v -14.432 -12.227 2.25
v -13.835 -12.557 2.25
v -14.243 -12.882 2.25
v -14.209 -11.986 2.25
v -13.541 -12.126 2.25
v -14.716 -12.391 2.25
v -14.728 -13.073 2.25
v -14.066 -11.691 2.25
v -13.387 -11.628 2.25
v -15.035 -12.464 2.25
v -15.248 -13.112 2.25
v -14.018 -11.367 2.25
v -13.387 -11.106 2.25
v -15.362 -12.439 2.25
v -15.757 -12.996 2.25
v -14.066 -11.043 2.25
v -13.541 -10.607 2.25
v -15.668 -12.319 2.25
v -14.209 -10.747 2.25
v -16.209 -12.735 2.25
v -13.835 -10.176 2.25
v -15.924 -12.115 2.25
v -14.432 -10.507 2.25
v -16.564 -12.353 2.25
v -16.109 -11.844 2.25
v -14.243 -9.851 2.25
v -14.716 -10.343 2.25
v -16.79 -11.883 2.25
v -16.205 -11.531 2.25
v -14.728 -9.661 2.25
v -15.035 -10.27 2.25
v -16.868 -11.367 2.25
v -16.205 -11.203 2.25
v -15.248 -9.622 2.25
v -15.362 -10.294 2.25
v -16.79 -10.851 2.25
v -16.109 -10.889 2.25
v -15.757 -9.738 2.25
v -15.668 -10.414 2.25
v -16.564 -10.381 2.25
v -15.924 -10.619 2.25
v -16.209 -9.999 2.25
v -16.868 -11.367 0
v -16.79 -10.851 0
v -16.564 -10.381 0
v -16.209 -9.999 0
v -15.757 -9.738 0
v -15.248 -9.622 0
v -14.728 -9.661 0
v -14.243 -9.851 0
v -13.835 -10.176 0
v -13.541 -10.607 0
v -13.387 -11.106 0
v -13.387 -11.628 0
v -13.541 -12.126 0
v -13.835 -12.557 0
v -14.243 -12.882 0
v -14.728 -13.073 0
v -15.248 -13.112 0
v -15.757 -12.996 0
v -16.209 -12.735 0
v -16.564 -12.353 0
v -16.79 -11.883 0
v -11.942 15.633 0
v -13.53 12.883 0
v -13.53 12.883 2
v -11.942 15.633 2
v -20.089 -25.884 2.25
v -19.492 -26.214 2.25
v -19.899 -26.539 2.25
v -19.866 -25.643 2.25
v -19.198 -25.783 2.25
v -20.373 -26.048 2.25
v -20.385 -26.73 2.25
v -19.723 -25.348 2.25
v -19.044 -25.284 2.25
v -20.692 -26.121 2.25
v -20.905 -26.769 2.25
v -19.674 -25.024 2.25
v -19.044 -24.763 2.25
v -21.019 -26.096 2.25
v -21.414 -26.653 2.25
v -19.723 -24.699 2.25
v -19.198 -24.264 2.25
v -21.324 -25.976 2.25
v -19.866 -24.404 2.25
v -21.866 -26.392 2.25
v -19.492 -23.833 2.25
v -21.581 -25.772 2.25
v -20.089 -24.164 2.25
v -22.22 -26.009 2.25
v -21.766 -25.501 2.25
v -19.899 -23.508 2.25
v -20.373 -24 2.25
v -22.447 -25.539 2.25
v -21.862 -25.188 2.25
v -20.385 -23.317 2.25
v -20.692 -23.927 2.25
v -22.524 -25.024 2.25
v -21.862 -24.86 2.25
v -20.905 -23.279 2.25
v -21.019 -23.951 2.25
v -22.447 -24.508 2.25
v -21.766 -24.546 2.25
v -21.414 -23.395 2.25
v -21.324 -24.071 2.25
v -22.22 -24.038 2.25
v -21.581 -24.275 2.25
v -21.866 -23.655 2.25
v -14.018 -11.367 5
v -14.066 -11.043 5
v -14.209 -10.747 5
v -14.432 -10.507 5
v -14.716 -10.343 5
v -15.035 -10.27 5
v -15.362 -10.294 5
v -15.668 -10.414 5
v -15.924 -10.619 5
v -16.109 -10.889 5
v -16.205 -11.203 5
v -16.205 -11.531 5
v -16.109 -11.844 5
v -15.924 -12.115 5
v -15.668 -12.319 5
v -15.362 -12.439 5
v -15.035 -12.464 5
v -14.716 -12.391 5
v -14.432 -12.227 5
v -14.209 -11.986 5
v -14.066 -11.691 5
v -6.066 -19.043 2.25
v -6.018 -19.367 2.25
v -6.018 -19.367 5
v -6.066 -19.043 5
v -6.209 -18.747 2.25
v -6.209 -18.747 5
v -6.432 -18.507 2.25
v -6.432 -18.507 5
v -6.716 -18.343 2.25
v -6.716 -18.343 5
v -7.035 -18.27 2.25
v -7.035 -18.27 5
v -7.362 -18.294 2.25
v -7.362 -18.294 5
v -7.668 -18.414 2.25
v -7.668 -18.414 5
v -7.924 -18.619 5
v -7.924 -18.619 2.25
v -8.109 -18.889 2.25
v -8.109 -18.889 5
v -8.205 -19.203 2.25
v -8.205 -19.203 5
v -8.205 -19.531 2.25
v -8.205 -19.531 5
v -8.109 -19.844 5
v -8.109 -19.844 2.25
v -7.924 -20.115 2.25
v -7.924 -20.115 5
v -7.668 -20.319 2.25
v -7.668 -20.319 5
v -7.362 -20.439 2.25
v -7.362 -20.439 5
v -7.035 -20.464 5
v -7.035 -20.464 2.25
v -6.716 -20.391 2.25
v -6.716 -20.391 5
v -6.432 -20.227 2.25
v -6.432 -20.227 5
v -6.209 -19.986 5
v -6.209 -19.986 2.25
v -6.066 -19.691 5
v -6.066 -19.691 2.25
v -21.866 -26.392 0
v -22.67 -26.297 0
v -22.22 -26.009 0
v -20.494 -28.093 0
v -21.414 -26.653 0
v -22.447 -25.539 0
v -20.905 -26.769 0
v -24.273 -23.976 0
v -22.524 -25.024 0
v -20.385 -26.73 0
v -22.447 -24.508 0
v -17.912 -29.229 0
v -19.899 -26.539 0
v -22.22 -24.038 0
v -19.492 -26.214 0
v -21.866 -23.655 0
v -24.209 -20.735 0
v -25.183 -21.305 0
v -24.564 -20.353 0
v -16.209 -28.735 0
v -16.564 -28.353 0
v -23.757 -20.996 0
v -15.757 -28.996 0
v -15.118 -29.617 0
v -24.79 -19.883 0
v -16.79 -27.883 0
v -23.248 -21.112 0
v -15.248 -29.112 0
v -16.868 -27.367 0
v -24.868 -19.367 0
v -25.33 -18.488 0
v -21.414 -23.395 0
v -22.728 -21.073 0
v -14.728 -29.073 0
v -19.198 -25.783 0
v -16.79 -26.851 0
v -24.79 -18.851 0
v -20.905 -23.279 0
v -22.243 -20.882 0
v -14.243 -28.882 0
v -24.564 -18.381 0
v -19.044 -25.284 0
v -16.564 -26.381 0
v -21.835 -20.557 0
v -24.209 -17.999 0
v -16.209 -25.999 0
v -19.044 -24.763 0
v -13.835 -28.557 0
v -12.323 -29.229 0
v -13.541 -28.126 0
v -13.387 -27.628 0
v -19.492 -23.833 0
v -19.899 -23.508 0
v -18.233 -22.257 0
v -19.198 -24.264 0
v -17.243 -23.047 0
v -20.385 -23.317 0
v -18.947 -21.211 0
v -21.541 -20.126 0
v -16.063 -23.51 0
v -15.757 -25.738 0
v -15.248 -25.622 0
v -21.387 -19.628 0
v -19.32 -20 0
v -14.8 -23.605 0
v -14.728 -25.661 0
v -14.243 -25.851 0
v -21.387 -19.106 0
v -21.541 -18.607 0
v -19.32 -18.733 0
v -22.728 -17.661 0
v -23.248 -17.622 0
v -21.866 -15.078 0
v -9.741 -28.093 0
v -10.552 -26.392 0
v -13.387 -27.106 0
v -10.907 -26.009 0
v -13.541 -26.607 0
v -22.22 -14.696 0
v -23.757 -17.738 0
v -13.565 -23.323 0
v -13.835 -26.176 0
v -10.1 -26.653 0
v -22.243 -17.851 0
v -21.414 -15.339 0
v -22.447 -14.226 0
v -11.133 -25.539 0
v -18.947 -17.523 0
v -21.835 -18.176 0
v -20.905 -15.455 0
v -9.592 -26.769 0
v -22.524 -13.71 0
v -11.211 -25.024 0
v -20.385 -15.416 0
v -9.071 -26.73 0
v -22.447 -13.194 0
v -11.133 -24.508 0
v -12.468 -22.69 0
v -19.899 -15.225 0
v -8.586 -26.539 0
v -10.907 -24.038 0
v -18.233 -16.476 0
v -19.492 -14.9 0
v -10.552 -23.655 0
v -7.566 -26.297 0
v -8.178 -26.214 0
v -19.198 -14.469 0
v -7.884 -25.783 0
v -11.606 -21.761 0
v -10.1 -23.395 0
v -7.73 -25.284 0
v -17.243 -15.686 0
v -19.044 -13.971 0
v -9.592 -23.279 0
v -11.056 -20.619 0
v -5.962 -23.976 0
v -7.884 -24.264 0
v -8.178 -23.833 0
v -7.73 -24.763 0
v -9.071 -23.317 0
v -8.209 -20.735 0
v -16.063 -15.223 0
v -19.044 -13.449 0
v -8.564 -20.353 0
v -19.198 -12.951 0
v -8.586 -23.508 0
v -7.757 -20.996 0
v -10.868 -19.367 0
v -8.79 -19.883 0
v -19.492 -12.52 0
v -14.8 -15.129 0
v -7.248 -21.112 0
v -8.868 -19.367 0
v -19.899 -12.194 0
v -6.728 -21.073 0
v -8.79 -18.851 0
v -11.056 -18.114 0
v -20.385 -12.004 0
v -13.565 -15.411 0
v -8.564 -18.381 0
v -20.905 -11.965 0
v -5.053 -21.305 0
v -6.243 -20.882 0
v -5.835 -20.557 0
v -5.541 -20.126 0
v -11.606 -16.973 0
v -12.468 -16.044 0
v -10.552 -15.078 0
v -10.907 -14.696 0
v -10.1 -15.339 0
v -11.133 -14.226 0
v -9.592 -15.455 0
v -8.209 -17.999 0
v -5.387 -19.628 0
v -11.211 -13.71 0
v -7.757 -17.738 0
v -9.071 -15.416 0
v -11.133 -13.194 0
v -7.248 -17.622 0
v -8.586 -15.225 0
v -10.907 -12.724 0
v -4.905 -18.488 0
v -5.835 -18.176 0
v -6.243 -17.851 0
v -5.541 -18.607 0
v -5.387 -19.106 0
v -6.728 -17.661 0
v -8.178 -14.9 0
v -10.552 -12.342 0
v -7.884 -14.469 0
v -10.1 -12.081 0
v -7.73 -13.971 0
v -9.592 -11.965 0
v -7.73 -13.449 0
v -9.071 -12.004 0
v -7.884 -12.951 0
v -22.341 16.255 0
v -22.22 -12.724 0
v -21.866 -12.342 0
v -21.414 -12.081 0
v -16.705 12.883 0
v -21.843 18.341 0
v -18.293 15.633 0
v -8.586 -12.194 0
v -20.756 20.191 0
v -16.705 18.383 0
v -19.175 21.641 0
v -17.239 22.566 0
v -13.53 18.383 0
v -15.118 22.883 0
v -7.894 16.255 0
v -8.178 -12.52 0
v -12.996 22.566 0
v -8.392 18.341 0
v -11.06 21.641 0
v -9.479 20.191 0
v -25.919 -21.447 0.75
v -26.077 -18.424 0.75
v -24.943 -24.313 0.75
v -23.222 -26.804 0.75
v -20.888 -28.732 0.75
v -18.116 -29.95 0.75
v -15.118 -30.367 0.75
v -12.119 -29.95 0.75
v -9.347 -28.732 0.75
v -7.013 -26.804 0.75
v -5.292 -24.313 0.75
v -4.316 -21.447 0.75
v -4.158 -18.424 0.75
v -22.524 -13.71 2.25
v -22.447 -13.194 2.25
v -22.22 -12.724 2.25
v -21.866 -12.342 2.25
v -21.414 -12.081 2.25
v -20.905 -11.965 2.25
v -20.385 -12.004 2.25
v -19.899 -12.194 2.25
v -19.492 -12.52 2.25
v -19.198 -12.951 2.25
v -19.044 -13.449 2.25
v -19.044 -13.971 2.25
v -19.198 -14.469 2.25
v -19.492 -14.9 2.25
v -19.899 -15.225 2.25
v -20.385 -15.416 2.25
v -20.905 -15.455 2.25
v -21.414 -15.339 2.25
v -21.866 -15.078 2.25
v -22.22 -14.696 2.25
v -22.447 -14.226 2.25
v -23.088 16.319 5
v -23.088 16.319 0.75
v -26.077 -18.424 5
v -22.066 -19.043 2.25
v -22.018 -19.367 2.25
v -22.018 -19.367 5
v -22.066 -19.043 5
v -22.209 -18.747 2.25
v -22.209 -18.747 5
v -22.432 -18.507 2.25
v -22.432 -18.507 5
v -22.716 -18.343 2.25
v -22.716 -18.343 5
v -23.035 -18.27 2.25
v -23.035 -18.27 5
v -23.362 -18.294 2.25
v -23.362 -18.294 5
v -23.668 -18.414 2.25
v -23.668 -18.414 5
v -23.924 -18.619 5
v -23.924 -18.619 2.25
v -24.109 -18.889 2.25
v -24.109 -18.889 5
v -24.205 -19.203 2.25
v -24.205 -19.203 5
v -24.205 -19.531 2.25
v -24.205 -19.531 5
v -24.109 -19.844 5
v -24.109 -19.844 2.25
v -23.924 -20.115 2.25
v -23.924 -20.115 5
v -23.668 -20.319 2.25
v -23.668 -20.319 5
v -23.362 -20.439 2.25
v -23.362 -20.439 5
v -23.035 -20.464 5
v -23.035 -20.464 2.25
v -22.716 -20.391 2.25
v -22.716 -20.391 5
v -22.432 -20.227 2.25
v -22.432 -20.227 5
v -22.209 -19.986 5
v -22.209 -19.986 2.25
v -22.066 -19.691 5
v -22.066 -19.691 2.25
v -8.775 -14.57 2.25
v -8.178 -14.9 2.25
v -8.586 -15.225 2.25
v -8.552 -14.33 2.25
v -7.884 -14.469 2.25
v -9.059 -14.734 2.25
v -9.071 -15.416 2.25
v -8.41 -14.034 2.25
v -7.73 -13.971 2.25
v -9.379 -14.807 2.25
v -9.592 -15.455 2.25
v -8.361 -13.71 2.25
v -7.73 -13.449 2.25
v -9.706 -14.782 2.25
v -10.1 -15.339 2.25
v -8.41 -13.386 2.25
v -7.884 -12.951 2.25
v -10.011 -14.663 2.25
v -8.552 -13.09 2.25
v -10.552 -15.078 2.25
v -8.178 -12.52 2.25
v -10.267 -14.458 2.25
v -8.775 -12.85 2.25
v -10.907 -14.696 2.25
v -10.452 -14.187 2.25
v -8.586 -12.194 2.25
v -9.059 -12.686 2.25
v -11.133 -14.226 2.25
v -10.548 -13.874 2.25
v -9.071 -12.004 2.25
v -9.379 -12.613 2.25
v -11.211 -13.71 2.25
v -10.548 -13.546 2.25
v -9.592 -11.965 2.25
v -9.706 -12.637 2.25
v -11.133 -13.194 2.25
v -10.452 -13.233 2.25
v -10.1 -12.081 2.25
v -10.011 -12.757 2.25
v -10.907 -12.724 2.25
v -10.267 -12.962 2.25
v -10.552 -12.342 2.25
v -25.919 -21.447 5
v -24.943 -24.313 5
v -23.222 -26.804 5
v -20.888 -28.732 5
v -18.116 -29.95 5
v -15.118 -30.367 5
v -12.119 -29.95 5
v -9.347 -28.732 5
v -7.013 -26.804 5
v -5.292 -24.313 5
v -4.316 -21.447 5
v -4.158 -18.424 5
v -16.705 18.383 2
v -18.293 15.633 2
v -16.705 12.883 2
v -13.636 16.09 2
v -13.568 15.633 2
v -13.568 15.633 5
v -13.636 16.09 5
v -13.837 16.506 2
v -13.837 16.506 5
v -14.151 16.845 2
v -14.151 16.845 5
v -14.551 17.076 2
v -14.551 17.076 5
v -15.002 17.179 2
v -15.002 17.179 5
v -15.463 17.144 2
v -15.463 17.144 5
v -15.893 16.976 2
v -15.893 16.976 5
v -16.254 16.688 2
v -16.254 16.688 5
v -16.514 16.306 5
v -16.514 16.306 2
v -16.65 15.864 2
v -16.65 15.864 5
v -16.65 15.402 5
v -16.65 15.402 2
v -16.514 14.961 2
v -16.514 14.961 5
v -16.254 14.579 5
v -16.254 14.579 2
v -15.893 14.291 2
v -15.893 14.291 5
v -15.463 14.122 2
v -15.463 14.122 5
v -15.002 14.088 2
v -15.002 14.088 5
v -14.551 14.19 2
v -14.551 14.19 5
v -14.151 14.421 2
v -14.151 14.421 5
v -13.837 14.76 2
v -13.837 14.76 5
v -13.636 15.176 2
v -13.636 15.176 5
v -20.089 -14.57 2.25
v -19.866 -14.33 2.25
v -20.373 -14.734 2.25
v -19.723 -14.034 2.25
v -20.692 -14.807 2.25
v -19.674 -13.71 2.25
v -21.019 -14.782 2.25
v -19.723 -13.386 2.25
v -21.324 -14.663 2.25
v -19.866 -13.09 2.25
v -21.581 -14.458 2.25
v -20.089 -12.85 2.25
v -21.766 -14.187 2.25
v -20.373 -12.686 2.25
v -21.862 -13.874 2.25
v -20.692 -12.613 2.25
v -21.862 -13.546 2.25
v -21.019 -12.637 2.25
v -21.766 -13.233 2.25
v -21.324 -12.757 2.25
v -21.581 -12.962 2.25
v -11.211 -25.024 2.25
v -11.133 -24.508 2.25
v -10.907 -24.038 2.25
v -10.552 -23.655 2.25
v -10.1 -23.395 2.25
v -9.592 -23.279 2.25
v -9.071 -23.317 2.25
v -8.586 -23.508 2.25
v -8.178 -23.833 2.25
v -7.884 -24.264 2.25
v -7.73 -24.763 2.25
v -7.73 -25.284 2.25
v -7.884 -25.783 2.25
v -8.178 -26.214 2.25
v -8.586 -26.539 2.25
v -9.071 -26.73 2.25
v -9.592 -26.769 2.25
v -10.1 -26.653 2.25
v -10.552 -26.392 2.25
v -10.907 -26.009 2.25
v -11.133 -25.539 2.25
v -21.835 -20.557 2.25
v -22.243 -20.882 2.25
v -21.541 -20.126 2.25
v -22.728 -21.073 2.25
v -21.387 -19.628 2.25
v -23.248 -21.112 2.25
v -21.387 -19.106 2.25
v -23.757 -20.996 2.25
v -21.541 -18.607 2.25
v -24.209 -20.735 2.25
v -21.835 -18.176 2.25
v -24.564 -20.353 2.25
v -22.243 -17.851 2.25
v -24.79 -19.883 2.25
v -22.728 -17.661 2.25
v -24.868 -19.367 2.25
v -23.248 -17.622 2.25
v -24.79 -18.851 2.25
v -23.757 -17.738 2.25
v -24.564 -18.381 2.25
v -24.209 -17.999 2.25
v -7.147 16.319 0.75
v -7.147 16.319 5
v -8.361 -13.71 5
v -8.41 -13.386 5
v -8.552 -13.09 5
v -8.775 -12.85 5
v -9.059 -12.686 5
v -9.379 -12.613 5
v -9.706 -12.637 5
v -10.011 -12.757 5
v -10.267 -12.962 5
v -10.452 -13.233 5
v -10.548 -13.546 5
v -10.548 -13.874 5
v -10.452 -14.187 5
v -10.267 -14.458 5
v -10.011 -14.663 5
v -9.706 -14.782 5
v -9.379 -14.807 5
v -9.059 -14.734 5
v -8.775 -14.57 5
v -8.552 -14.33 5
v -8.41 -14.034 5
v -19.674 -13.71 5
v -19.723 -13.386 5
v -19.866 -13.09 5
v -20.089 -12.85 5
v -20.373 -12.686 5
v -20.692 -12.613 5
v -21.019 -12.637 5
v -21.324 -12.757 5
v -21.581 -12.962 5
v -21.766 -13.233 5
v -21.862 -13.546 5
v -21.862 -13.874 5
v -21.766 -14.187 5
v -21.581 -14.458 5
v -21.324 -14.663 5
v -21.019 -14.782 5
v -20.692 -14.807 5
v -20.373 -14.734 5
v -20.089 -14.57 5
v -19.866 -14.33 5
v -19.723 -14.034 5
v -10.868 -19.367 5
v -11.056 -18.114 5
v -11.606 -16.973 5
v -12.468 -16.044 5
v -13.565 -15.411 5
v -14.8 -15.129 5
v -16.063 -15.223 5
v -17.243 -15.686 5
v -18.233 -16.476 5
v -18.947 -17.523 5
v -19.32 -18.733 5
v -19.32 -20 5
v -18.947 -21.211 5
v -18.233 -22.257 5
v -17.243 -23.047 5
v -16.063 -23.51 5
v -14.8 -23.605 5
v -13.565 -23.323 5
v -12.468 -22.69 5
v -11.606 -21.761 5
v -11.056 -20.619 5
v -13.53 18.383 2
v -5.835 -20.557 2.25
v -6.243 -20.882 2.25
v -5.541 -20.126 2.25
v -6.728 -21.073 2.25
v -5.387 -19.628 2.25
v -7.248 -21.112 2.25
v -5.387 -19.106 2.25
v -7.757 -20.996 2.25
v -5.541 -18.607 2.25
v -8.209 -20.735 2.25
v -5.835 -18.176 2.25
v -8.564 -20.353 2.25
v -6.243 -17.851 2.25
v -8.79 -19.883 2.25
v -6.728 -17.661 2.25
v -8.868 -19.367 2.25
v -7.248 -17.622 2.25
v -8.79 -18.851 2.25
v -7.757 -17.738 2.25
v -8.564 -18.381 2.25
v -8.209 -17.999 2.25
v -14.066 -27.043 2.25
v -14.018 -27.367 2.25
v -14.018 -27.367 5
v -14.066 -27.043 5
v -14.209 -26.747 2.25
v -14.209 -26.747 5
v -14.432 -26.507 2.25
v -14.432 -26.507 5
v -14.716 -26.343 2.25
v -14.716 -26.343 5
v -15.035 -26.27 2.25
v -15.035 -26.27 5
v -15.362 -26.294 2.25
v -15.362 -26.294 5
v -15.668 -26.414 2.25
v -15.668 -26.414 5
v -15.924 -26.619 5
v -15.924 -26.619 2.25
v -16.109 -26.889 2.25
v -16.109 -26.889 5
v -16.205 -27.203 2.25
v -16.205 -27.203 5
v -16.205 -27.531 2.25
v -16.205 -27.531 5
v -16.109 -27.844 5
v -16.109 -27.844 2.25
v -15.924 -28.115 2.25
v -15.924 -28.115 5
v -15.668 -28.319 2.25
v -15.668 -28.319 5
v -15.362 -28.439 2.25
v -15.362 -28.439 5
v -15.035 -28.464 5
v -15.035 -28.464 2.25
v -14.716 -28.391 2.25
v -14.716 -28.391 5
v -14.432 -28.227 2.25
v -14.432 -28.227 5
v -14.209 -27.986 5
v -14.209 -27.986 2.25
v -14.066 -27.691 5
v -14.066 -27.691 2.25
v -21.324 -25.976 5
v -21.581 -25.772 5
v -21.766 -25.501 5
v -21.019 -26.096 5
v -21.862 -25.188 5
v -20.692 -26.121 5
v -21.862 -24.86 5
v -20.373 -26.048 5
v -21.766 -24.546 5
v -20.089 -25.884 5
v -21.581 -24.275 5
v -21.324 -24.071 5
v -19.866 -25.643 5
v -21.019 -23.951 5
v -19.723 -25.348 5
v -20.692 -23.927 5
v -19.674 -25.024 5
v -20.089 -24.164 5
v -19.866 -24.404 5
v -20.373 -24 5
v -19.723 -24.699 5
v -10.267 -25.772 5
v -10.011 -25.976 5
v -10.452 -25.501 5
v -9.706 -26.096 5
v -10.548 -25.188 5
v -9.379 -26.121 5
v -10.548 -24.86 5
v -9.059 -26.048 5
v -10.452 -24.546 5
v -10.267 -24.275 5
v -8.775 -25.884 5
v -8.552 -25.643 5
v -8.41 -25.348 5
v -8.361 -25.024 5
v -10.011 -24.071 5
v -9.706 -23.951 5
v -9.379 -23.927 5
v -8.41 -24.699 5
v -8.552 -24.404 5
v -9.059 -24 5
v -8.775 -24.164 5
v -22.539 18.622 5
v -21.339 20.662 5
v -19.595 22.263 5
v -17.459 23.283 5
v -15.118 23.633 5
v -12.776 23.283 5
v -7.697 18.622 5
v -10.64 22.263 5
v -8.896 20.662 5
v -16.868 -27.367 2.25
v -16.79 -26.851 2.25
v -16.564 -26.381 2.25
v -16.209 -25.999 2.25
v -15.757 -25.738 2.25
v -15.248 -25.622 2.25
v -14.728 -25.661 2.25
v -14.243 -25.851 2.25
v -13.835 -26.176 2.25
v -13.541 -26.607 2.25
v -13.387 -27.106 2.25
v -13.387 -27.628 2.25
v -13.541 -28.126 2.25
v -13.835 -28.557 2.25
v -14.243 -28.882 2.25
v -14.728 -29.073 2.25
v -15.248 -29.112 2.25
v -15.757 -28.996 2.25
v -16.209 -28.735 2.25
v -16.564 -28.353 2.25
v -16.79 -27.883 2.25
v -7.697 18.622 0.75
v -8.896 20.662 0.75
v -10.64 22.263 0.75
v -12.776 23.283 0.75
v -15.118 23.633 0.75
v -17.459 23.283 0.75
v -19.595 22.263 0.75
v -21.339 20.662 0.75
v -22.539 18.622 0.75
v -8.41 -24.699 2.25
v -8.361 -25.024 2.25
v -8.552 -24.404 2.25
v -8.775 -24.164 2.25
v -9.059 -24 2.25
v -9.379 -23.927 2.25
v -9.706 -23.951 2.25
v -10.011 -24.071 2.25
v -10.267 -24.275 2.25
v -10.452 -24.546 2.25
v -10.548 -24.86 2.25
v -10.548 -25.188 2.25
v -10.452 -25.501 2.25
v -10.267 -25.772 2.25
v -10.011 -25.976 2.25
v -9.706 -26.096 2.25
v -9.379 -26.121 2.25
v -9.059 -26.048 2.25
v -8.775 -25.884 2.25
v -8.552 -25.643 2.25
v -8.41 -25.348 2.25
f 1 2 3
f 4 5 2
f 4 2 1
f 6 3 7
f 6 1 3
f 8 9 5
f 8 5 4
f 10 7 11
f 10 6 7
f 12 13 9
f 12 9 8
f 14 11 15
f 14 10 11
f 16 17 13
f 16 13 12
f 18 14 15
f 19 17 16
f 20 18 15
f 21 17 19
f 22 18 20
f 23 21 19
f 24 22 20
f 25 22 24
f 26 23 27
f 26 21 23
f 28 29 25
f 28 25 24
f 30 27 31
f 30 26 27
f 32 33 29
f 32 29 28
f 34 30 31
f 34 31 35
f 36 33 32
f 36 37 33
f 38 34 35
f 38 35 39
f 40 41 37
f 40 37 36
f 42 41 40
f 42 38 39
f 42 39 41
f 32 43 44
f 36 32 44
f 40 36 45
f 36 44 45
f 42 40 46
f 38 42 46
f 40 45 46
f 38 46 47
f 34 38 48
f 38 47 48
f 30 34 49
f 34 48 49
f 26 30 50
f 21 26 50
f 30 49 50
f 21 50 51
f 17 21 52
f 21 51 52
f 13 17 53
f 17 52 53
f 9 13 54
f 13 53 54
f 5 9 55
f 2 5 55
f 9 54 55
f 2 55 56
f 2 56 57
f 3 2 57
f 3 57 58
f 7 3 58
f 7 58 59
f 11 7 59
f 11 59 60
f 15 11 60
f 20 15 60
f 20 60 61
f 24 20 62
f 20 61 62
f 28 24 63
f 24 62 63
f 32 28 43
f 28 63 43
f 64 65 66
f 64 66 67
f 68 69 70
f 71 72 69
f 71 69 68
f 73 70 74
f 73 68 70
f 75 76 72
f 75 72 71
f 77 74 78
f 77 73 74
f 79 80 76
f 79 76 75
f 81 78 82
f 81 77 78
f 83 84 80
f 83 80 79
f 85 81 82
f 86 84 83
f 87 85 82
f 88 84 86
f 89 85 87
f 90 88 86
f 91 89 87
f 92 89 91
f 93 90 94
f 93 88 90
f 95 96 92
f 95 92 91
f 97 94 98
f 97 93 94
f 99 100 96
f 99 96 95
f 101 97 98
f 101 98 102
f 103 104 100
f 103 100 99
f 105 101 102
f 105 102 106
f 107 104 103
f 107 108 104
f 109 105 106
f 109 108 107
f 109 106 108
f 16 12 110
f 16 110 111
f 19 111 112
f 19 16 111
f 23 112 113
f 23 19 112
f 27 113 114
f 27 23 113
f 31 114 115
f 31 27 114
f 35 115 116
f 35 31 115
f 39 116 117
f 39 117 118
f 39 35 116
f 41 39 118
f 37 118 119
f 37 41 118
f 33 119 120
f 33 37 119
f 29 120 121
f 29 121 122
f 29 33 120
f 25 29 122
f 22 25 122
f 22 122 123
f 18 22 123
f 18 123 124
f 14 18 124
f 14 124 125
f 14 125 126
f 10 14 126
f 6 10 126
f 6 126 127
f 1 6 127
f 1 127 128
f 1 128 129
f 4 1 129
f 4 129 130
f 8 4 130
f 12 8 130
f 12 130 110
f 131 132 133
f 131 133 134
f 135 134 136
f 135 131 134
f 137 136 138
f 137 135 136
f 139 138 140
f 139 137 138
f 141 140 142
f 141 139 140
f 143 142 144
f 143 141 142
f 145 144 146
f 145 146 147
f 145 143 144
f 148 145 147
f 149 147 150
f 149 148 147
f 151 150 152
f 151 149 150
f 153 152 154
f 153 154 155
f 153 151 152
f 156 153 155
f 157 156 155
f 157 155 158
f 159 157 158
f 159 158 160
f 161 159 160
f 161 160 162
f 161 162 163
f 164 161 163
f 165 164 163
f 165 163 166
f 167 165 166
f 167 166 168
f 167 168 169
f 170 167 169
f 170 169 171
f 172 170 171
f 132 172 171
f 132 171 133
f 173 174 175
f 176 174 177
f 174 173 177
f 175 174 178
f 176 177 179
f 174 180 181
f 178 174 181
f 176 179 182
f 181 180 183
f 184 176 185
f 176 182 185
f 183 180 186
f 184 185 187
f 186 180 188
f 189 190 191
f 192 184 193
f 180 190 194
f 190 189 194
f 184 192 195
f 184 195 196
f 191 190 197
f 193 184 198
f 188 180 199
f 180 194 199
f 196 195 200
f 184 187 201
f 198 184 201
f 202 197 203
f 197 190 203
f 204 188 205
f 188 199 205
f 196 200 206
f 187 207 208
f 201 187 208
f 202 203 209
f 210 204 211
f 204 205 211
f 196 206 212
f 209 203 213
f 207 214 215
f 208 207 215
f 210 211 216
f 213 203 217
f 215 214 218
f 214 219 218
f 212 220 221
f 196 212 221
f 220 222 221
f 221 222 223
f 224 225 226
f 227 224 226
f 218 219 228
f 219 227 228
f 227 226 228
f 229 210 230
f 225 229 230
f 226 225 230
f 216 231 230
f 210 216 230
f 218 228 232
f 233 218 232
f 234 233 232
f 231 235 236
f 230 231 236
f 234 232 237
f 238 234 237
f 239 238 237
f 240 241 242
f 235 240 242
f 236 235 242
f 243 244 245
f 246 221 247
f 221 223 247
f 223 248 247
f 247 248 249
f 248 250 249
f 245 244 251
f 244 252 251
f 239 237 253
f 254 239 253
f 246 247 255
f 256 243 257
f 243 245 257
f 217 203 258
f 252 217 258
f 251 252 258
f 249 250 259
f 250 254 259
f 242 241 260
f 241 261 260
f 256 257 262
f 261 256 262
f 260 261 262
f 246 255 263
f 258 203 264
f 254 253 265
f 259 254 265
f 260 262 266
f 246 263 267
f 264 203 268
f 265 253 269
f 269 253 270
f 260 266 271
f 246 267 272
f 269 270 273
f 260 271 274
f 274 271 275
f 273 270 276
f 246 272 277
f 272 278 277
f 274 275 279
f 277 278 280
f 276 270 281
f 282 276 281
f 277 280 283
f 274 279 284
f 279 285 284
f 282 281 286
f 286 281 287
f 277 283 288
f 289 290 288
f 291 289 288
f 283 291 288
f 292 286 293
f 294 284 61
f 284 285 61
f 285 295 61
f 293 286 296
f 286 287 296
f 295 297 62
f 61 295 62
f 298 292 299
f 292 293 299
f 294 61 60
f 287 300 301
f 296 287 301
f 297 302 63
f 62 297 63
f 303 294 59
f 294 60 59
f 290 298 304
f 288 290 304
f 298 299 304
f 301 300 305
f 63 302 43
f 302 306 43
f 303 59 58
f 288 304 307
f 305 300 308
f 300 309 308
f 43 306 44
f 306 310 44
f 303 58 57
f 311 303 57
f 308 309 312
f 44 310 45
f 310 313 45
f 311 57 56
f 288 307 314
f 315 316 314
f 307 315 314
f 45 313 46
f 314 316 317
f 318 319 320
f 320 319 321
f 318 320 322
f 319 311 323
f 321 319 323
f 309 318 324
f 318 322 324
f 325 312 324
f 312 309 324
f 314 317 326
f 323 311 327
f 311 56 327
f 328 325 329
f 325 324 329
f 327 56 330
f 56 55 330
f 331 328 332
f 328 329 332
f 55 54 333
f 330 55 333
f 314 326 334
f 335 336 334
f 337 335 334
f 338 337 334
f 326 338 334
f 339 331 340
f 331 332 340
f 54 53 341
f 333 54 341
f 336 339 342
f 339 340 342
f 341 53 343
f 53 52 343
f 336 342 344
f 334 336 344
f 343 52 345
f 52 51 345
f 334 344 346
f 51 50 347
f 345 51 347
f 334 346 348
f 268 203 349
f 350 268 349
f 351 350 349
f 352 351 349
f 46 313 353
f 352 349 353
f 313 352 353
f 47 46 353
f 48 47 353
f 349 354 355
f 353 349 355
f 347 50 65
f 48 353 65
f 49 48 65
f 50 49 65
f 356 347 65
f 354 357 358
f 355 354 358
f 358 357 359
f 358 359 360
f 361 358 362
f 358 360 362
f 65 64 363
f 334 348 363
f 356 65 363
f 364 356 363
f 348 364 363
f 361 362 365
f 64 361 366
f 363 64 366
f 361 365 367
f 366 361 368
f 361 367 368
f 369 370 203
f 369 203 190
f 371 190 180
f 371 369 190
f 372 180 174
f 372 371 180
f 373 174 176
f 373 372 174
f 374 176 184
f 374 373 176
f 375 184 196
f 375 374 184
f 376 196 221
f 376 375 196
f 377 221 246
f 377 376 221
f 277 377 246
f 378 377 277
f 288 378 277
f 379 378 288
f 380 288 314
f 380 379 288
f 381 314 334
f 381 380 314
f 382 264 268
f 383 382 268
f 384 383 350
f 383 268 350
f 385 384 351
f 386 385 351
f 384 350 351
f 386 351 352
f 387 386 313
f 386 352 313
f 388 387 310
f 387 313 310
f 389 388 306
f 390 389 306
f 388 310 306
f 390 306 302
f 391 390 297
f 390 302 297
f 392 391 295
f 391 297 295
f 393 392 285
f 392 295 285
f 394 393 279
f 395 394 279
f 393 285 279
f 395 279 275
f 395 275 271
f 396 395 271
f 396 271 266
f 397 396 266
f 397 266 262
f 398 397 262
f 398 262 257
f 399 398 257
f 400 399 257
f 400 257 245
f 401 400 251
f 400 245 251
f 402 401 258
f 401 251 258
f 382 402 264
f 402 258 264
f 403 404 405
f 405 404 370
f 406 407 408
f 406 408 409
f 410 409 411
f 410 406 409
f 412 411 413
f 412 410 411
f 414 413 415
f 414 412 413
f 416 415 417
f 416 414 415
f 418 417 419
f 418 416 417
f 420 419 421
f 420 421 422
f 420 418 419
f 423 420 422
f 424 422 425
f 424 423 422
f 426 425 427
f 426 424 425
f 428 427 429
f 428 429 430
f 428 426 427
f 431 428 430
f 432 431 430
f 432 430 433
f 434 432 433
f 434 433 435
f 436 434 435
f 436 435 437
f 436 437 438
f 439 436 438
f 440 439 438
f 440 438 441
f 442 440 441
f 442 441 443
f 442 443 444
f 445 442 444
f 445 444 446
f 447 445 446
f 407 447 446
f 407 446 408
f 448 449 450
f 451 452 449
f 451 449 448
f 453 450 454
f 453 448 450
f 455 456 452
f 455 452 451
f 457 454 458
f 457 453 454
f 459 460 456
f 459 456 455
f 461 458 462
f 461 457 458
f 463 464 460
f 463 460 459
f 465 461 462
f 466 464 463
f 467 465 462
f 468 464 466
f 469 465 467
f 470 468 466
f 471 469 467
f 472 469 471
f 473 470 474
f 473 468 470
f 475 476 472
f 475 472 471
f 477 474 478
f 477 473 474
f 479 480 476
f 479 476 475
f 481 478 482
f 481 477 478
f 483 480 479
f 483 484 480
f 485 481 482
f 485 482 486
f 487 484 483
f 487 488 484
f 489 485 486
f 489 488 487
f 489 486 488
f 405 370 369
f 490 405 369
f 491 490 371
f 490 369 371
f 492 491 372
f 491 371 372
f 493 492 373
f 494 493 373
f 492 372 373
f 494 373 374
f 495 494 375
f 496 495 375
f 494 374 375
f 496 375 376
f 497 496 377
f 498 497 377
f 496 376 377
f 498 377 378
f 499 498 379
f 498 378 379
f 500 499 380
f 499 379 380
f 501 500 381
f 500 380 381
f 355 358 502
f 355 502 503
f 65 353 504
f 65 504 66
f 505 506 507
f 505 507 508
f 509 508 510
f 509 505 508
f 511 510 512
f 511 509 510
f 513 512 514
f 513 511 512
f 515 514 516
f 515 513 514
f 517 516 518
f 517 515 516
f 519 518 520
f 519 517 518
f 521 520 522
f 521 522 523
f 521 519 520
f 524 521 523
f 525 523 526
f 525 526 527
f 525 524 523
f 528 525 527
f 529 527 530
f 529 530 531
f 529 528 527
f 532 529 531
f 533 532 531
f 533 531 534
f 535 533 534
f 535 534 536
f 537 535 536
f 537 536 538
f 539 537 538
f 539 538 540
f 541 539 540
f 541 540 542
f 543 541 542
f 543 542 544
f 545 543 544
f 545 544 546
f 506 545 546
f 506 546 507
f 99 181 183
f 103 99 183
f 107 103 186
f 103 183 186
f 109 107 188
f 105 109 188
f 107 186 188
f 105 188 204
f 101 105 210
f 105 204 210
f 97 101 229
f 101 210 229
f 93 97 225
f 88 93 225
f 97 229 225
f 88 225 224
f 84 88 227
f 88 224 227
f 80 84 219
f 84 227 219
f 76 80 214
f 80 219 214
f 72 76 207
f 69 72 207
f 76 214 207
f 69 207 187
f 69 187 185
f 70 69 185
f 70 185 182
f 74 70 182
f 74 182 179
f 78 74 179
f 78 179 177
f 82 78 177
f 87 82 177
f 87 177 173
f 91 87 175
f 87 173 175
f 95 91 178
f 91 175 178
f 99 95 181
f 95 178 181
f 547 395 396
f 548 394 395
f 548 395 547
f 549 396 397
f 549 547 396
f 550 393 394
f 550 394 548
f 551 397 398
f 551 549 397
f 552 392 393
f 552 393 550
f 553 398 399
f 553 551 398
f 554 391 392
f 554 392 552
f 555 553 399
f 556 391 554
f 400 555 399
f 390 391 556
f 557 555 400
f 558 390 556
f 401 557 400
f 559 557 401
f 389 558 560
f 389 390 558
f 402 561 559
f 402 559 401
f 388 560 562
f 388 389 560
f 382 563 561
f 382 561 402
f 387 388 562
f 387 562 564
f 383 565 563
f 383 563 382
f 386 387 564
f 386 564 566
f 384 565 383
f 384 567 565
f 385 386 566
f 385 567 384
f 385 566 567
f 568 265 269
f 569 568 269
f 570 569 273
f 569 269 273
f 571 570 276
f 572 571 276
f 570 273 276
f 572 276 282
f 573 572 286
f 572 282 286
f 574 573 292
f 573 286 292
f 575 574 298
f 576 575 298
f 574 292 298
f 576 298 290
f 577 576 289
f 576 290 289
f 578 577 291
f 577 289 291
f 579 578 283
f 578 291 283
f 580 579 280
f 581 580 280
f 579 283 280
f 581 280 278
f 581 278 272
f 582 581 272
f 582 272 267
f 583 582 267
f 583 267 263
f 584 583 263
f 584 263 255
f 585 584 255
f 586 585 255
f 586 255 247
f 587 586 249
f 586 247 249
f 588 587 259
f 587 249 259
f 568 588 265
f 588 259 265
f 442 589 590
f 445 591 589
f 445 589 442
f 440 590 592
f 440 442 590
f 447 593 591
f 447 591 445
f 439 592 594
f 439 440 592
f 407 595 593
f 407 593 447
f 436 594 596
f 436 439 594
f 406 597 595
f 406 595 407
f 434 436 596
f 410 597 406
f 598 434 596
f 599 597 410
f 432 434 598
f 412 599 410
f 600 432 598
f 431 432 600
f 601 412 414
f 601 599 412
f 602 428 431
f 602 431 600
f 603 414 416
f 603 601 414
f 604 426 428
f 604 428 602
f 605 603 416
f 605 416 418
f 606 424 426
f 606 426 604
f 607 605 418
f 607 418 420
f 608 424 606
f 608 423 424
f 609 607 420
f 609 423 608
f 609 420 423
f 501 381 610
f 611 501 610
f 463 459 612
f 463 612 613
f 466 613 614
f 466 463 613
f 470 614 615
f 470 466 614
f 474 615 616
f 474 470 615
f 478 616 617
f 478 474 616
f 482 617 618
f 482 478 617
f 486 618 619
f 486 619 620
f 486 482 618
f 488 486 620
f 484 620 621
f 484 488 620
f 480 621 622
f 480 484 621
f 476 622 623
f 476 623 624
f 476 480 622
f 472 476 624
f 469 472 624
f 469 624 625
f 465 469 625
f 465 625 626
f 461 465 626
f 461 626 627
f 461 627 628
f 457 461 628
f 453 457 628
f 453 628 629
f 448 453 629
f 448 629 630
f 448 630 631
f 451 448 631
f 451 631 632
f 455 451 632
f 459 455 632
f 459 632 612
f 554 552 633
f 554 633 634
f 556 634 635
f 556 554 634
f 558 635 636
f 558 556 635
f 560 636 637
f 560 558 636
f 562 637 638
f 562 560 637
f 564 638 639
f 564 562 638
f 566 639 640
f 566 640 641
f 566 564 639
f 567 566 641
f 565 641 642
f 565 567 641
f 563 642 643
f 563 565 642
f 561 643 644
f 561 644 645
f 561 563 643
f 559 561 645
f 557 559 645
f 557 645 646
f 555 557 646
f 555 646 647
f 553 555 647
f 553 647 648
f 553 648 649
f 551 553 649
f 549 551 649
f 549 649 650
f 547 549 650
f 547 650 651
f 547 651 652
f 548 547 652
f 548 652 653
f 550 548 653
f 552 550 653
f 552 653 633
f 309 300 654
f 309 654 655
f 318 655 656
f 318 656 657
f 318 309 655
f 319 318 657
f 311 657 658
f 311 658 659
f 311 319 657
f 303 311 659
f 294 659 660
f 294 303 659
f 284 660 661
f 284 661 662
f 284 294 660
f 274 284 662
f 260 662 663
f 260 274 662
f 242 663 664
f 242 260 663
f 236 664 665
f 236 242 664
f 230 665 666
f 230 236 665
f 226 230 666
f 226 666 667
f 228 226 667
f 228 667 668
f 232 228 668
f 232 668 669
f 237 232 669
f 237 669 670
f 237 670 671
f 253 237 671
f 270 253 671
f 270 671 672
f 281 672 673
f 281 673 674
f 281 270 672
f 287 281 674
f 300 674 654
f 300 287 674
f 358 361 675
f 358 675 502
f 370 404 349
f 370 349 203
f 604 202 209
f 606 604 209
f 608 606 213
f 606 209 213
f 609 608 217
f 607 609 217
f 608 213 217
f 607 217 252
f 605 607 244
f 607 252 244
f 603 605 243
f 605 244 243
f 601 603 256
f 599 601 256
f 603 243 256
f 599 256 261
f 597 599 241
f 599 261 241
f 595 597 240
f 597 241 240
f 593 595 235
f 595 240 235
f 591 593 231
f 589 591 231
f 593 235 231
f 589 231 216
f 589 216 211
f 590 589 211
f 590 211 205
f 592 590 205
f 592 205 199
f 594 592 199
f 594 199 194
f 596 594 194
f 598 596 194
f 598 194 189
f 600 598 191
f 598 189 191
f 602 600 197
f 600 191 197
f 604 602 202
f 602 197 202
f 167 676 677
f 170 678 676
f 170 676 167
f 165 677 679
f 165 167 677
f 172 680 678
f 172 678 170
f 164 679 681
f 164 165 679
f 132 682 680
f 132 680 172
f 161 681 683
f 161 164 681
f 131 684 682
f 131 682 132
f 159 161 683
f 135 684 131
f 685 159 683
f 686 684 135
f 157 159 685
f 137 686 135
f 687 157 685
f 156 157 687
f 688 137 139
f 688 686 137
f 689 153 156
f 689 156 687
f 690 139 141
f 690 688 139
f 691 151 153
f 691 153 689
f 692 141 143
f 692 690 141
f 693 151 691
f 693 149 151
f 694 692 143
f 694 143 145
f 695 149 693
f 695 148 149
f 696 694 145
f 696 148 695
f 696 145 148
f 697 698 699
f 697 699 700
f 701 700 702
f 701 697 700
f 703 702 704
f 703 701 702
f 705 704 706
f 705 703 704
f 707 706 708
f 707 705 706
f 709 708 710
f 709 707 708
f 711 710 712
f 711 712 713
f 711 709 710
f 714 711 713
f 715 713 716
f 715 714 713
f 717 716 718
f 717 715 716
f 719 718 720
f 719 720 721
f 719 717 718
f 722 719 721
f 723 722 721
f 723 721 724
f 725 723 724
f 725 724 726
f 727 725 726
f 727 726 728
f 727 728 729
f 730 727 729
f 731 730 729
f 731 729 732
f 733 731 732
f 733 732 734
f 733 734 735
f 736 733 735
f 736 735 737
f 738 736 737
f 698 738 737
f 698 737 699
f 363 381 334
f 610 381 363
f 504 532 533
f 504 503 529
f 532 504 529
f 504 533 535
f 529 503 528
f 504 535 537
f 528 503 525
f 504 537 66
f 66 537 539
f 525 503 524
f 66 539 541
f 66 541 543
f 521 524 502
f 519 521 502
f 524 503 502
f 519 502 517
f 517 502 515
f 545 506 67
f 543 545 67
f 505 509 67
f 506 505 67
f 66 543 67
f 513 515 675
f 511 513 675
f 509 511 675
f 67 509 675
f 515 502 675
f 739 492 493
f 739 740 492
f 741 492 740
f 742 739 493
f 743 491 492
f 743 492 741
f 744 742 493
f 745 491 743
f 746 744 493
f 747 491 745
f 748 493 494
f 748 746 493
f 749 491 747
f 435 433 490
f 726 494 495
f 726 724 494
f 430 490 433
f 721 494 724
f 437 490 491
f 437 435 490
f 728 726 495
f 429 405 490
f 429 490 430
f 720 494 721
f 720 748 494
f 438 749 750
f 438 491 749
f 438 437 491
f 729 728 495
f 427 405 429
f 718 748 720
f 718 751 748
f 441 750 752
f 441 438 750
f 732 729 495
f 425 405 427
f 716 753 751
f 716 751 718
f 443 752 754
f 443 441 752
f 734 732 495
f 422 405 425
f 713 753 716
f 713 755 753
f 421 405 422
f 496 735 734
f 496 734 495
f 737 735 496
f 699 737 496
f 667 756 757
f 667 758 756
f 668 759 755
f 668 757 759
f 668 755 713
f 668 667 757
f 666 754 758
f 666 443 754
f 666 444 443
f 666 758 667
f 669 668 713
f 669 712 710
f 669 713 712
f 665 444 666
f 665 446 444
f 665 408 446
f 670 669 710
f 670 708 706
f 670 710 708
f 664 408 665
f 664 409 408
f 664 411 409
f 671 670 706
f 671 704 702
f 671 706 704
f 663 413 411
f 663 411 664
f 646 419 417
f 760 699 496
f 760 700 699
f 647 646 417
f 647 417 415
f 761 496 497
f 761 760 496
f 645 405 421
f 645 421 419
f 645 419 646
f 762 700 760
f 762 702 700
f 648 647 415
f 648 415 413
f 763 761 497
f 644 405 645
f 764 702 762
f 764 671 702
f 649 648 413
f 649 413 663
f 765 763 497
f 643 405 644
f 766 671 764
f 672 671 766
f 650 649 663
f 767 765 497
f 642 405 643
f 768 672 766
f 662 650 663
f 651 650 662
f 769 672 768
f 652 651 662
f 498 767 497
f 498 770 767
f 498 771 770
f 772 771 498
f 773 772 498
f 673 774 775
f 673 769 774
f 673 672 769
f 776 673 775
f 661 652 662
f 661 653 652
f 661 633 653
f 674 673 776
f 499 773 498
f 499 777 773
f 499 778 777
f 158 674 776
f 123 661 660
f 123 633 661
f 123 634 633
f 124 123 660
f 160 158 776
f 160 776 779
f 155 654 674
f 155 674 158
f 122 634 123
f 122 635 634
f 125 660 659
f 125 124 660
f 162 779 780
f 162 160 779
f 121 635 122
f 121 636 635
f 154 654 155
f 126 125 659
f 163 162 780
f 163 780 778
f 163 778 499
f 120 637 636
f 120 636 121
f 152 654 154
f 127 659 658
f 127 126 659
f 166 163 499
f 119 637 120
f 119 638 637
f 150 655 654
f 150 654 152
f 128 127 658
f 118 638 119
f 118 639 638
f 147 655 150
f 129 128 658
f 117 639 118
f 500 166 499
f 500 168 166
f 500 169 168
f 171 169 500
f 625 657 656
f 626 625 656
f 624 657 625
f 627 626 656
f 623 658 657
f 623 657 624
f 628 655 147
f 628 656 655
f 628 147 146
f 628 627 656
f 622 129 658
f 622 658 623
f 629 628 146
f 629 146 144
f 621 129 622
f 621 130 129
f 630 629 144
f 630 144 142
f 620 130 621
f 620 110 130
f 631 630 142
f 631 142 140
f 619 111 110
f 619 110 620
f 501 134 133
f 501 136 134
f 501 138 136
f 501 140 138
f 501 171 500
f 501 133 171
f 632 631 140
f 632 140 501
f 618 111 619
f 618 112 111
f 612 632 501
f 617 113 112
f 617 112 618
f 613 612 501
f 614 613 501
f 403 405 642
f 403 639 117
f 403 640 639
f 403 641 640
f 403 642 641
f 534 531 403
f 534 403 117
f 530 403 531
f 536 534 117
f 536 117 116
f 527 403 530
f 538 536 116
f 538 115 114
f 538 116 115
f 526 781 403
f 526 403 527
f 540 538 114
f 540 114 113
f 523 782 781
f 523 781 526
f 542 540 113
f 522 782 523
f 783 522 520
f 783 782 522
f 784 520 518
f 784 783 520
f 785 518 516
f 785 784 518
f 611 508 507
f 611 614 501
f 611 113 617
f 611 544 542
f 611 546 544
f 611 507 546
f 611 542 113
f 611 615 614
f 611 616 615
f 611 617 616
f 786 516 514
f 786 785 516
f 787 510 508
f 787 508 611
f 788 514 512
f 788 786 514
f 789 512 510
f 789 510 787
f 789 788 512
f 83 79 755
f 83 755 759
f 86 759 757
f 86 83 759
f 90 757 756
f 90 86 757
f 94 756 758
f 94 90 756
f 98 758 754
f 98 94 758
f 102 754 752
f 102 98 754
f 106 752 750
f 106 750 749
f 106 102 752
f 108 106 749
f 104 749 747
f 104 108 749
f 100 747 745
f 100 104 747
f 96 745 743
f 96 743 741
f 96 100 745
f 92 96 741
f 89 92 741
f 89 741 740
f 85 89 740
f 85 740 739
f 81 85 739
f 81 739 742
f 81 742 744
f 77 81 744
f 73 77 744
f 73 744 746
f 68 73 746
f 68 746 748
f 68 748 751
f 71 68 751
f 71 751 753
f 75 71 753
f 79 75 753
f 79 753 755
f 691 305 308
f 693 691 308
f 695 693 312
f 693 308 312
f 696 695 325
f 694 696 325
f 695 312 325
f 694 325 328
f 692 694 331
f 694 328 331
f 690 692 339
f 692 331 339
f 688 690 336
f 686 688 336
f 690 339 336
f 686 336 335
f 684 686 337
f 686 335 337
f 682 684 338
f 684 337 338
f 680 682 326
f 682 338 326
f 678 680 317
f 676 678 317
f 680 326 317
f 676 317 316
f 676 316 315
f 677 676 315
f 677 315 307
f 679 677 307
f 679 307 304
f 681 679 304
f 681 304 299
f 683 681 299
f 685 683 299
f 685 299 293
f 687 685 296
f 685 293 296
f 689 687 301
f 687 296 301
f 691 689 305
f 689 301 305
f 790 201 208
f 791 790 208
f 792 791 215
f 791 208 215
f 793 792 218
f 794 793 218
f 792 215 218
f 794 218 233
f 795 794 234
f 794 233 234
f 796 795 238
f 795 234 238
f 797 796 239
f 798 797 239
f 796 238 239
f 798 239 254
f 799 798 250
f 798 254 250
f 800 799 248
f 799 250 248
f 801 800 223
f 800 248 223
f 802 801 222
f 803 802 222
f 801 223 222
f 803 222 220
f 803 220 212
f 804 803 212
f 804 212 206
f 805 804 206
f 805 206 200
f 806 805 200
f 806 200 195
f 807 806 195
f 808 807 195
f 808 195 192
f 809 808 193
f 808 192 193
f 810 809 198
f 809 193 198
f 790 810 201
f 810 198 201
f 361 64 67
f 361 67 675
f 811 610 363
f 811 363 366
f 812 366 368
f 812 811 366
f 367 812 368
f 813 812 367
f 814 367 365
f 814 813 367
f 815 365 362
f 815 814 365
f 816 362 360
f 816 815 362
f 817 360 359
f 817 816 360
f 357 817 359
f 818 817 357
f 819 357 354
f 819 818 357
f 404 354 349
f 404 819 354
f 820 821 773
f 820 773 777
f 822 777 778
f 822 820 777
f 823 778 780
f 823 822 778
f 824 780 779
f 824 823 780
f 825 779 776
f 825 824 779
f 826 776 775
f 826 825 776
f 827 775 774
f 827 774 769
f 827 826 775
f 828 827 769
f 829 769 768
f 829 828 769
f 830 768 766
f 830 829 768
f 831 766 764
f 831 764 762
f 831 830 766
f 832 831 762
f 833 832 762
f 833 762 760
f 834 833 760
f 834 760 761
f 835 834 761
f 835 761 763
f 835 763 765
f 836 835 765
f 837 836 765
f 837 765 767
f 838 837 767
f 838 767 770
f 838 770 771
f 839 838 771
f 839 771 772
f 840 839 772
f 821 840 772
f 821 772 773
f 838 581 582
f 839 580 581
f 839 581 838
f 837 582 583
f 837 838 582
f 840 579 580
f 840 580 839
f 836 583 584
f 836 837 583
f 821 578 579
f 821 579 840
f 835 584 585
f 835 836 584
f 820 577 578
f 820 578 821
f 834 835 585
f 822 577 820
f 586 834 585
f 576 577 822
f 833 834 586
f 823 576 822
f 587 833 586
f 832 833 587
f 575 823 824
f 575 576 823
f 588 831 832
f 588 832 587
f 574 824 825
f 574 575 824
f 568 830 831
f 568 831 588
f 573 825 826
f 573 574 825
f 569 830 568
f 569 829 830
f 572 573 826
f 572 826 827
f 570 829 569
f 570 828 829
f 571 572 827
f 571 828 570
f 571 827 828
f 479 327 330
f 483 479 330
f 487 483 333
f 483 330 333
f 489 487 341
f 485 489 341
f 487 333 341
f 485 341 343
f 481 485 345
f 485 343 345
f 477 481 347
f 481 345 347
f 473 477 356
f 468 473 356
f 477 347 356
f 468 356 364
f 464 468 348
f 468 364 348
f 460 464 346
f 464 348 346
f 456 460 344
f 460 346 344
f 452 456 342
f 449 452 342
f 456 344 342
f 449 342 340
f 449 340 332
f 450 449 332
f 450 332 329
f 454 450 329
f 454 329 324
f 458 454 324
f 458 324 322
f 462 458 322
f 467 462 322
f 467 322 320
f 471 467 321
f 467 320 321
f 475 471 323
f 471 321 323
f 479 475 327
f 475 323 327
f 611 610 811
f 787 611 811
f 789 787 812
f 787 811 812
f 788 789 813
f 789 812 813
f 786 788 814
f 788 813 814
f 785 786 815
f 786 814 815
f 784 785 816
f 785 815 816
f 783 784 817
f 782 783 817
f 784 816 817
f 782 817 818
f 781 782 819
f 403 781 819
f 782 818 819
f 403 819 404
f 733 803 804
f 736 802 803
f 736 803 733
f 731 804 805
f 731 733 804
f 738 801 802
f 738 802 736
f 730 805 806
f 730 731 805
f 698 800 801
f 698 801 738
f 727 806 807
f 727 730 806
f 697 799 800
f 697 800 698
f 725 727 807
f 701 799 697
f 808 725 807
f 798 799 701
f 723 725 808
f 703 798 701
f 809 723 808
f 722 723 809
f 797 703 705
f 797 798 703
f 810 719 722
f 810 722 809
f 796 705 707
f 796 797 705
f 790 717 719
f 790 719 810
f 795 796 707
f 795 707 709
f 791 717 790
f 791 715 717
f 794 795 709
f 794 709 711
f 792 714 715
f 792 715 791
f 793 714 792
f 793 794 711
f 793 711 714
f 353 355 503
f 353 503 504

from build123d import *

# Parameters (mm, degrees)
SKETCH1_R           = 1.55
SKETCH1_R_2         = 4.25
SKETCH1_R_3         = 1.1
BOSS_EXTRUDE1_DEPTH = 5
CUT_EXTRUDE2_DEPTH  = 2
SKETCH4_R           = 1.75
CUT_EXTRUDE3_DEPTH  = 2.25
CHAFL_N1_SIZE       = 0.75


with BuildPart() as part:
    # Sketch1 → Boss-Extrude1 (new body)
    with BuildSketch(Plane.XY):
        with BuildLine():
            Line((-23.088186689, 16.318953541), (-26.077145964, -18.423903602))
            ThreePointArc((-26.077145964, -18.423903602), (-15.11762862, -30.366760745), (-4.158111277, -18.423903602))
            Line((-4.158111277, -18.423903602), (-7.147070552, 16.318953541))
            ThreePointArc((-7.147070552, 16.318953541), (-15.11762862, 23.633239255), (-23.088186689, 16.318953541))
        make_face()
        with Locations((-15.11762862, 15.633239255)):
            Circle(SKETCH1_R, mode=Mode.SUBTRACT)
        with Locations((-15.11762862, -19.366760745)):
            Circle(SKETCH1_R_2, mode=Mode.SUBTRACT)
        with Locations((-7.11762862, -19.366760745)):
            Circle(SKETCH1_R_3, mode=Mode.SUBTRACT)
        with Locations((-9.460774371, -25.023614994)):
            Circle(SKETCH1_R_3, mode=Mode.SUBTRACT)
        with Locations((-15.11762862, -27.366760745)):
            Circle(SKETCH1_R_3, mode=Mode.SUBTRACT)
        with Locations((-20.77448287, -25.023614994)):
            Circle(SKETCH1_R_3, mode=Mode.SUBTRACT)
        with Locations((-23.11762862, -19.366760745)):
            Circle(SKETCH1_R_3, mode=Mode.SUBTRACT)
        with Locations((-20.77448287, -13.709906495)):
            Circle(SKETCH1_R_3, mode=Mode.SUBTRACT)
        with Locations((-15.11762862, -11.366760745)):
            Circle(SKETCH1_R_3, mode=Mode.SUBTRACT)
        with Locations((-9.460774371, -13.709906495)):
            Circle(SKETCH1_R_3, mode=Mode.SUBTRACT)
    extrude(amount=BOSS_EXTRUDE1_DEPTH)

    # Sketch3 → Cut-Extrude2 (cut)
    with BuildSketch(Plane.XY):
        Polygon((-13.52991538, 12.883239255), (-11.94220214, 15.633239255), (-13.52991538, 18.383239255), (-16.705341861, 18.383239255), (-18.293055101, 15.633239255), (-16.705341861, 12.883239255), align=None)
    extrude(amount=CUT_EXTRUDE2_DEPTH, mode=Mode.SUBTRACT)

    # Sketch4 → Cut-Extrude3 (cut)
    with BuildSketch(Plane(origin=(0, 0, 0), x_dir=(-1, 0, 0), z_dir=(0, 0, -1))):
        with Locations((23.11762862, -19.366760745)):
            Circle(SKETCH4_R)
        with Locations((20.77448287, -25.023614994)):
            Circle(SKETCH4_R)
        with Locations((15.11762862, -27.366760745)):
            Circle(SKETCH4_R)
        with Locations((9.460774371, -25.023614994)):
            Circle(SKETCH4_R)
        with Locations((7.11762862, -19.366760745)):
            Circle(SKETCH4_R)
        with Locations((9.460774371, -13.709906495)):
            Circle(SKETCH4_R)
        with Locations((15.11762862, -11.366760745)):
            Circle(SKETCH4_R)
        with Locations((20.77448287, -13.709906495)):
            Circle(SKETCH4_R)
    extrude(amount=-CUT_EXTRUDE3_DEPTH, mode=Mode.SUBTRACT)

    # Chaflán1
    chafl_n1_edges = [part.edges().sort_by_distance(p)[0] for p in [
        (-5.652590914, -1.05247503, 0),
        (-15.11762862, -30.366760745, 0),
        (-24.582666326, -1.05247503, 0),
        (-15.11762862, 23.633239255, 0),
    ]]
    chamfer(chafl_n1_edges, length=CHAFL_N1_SIZE)


solid = part.part
